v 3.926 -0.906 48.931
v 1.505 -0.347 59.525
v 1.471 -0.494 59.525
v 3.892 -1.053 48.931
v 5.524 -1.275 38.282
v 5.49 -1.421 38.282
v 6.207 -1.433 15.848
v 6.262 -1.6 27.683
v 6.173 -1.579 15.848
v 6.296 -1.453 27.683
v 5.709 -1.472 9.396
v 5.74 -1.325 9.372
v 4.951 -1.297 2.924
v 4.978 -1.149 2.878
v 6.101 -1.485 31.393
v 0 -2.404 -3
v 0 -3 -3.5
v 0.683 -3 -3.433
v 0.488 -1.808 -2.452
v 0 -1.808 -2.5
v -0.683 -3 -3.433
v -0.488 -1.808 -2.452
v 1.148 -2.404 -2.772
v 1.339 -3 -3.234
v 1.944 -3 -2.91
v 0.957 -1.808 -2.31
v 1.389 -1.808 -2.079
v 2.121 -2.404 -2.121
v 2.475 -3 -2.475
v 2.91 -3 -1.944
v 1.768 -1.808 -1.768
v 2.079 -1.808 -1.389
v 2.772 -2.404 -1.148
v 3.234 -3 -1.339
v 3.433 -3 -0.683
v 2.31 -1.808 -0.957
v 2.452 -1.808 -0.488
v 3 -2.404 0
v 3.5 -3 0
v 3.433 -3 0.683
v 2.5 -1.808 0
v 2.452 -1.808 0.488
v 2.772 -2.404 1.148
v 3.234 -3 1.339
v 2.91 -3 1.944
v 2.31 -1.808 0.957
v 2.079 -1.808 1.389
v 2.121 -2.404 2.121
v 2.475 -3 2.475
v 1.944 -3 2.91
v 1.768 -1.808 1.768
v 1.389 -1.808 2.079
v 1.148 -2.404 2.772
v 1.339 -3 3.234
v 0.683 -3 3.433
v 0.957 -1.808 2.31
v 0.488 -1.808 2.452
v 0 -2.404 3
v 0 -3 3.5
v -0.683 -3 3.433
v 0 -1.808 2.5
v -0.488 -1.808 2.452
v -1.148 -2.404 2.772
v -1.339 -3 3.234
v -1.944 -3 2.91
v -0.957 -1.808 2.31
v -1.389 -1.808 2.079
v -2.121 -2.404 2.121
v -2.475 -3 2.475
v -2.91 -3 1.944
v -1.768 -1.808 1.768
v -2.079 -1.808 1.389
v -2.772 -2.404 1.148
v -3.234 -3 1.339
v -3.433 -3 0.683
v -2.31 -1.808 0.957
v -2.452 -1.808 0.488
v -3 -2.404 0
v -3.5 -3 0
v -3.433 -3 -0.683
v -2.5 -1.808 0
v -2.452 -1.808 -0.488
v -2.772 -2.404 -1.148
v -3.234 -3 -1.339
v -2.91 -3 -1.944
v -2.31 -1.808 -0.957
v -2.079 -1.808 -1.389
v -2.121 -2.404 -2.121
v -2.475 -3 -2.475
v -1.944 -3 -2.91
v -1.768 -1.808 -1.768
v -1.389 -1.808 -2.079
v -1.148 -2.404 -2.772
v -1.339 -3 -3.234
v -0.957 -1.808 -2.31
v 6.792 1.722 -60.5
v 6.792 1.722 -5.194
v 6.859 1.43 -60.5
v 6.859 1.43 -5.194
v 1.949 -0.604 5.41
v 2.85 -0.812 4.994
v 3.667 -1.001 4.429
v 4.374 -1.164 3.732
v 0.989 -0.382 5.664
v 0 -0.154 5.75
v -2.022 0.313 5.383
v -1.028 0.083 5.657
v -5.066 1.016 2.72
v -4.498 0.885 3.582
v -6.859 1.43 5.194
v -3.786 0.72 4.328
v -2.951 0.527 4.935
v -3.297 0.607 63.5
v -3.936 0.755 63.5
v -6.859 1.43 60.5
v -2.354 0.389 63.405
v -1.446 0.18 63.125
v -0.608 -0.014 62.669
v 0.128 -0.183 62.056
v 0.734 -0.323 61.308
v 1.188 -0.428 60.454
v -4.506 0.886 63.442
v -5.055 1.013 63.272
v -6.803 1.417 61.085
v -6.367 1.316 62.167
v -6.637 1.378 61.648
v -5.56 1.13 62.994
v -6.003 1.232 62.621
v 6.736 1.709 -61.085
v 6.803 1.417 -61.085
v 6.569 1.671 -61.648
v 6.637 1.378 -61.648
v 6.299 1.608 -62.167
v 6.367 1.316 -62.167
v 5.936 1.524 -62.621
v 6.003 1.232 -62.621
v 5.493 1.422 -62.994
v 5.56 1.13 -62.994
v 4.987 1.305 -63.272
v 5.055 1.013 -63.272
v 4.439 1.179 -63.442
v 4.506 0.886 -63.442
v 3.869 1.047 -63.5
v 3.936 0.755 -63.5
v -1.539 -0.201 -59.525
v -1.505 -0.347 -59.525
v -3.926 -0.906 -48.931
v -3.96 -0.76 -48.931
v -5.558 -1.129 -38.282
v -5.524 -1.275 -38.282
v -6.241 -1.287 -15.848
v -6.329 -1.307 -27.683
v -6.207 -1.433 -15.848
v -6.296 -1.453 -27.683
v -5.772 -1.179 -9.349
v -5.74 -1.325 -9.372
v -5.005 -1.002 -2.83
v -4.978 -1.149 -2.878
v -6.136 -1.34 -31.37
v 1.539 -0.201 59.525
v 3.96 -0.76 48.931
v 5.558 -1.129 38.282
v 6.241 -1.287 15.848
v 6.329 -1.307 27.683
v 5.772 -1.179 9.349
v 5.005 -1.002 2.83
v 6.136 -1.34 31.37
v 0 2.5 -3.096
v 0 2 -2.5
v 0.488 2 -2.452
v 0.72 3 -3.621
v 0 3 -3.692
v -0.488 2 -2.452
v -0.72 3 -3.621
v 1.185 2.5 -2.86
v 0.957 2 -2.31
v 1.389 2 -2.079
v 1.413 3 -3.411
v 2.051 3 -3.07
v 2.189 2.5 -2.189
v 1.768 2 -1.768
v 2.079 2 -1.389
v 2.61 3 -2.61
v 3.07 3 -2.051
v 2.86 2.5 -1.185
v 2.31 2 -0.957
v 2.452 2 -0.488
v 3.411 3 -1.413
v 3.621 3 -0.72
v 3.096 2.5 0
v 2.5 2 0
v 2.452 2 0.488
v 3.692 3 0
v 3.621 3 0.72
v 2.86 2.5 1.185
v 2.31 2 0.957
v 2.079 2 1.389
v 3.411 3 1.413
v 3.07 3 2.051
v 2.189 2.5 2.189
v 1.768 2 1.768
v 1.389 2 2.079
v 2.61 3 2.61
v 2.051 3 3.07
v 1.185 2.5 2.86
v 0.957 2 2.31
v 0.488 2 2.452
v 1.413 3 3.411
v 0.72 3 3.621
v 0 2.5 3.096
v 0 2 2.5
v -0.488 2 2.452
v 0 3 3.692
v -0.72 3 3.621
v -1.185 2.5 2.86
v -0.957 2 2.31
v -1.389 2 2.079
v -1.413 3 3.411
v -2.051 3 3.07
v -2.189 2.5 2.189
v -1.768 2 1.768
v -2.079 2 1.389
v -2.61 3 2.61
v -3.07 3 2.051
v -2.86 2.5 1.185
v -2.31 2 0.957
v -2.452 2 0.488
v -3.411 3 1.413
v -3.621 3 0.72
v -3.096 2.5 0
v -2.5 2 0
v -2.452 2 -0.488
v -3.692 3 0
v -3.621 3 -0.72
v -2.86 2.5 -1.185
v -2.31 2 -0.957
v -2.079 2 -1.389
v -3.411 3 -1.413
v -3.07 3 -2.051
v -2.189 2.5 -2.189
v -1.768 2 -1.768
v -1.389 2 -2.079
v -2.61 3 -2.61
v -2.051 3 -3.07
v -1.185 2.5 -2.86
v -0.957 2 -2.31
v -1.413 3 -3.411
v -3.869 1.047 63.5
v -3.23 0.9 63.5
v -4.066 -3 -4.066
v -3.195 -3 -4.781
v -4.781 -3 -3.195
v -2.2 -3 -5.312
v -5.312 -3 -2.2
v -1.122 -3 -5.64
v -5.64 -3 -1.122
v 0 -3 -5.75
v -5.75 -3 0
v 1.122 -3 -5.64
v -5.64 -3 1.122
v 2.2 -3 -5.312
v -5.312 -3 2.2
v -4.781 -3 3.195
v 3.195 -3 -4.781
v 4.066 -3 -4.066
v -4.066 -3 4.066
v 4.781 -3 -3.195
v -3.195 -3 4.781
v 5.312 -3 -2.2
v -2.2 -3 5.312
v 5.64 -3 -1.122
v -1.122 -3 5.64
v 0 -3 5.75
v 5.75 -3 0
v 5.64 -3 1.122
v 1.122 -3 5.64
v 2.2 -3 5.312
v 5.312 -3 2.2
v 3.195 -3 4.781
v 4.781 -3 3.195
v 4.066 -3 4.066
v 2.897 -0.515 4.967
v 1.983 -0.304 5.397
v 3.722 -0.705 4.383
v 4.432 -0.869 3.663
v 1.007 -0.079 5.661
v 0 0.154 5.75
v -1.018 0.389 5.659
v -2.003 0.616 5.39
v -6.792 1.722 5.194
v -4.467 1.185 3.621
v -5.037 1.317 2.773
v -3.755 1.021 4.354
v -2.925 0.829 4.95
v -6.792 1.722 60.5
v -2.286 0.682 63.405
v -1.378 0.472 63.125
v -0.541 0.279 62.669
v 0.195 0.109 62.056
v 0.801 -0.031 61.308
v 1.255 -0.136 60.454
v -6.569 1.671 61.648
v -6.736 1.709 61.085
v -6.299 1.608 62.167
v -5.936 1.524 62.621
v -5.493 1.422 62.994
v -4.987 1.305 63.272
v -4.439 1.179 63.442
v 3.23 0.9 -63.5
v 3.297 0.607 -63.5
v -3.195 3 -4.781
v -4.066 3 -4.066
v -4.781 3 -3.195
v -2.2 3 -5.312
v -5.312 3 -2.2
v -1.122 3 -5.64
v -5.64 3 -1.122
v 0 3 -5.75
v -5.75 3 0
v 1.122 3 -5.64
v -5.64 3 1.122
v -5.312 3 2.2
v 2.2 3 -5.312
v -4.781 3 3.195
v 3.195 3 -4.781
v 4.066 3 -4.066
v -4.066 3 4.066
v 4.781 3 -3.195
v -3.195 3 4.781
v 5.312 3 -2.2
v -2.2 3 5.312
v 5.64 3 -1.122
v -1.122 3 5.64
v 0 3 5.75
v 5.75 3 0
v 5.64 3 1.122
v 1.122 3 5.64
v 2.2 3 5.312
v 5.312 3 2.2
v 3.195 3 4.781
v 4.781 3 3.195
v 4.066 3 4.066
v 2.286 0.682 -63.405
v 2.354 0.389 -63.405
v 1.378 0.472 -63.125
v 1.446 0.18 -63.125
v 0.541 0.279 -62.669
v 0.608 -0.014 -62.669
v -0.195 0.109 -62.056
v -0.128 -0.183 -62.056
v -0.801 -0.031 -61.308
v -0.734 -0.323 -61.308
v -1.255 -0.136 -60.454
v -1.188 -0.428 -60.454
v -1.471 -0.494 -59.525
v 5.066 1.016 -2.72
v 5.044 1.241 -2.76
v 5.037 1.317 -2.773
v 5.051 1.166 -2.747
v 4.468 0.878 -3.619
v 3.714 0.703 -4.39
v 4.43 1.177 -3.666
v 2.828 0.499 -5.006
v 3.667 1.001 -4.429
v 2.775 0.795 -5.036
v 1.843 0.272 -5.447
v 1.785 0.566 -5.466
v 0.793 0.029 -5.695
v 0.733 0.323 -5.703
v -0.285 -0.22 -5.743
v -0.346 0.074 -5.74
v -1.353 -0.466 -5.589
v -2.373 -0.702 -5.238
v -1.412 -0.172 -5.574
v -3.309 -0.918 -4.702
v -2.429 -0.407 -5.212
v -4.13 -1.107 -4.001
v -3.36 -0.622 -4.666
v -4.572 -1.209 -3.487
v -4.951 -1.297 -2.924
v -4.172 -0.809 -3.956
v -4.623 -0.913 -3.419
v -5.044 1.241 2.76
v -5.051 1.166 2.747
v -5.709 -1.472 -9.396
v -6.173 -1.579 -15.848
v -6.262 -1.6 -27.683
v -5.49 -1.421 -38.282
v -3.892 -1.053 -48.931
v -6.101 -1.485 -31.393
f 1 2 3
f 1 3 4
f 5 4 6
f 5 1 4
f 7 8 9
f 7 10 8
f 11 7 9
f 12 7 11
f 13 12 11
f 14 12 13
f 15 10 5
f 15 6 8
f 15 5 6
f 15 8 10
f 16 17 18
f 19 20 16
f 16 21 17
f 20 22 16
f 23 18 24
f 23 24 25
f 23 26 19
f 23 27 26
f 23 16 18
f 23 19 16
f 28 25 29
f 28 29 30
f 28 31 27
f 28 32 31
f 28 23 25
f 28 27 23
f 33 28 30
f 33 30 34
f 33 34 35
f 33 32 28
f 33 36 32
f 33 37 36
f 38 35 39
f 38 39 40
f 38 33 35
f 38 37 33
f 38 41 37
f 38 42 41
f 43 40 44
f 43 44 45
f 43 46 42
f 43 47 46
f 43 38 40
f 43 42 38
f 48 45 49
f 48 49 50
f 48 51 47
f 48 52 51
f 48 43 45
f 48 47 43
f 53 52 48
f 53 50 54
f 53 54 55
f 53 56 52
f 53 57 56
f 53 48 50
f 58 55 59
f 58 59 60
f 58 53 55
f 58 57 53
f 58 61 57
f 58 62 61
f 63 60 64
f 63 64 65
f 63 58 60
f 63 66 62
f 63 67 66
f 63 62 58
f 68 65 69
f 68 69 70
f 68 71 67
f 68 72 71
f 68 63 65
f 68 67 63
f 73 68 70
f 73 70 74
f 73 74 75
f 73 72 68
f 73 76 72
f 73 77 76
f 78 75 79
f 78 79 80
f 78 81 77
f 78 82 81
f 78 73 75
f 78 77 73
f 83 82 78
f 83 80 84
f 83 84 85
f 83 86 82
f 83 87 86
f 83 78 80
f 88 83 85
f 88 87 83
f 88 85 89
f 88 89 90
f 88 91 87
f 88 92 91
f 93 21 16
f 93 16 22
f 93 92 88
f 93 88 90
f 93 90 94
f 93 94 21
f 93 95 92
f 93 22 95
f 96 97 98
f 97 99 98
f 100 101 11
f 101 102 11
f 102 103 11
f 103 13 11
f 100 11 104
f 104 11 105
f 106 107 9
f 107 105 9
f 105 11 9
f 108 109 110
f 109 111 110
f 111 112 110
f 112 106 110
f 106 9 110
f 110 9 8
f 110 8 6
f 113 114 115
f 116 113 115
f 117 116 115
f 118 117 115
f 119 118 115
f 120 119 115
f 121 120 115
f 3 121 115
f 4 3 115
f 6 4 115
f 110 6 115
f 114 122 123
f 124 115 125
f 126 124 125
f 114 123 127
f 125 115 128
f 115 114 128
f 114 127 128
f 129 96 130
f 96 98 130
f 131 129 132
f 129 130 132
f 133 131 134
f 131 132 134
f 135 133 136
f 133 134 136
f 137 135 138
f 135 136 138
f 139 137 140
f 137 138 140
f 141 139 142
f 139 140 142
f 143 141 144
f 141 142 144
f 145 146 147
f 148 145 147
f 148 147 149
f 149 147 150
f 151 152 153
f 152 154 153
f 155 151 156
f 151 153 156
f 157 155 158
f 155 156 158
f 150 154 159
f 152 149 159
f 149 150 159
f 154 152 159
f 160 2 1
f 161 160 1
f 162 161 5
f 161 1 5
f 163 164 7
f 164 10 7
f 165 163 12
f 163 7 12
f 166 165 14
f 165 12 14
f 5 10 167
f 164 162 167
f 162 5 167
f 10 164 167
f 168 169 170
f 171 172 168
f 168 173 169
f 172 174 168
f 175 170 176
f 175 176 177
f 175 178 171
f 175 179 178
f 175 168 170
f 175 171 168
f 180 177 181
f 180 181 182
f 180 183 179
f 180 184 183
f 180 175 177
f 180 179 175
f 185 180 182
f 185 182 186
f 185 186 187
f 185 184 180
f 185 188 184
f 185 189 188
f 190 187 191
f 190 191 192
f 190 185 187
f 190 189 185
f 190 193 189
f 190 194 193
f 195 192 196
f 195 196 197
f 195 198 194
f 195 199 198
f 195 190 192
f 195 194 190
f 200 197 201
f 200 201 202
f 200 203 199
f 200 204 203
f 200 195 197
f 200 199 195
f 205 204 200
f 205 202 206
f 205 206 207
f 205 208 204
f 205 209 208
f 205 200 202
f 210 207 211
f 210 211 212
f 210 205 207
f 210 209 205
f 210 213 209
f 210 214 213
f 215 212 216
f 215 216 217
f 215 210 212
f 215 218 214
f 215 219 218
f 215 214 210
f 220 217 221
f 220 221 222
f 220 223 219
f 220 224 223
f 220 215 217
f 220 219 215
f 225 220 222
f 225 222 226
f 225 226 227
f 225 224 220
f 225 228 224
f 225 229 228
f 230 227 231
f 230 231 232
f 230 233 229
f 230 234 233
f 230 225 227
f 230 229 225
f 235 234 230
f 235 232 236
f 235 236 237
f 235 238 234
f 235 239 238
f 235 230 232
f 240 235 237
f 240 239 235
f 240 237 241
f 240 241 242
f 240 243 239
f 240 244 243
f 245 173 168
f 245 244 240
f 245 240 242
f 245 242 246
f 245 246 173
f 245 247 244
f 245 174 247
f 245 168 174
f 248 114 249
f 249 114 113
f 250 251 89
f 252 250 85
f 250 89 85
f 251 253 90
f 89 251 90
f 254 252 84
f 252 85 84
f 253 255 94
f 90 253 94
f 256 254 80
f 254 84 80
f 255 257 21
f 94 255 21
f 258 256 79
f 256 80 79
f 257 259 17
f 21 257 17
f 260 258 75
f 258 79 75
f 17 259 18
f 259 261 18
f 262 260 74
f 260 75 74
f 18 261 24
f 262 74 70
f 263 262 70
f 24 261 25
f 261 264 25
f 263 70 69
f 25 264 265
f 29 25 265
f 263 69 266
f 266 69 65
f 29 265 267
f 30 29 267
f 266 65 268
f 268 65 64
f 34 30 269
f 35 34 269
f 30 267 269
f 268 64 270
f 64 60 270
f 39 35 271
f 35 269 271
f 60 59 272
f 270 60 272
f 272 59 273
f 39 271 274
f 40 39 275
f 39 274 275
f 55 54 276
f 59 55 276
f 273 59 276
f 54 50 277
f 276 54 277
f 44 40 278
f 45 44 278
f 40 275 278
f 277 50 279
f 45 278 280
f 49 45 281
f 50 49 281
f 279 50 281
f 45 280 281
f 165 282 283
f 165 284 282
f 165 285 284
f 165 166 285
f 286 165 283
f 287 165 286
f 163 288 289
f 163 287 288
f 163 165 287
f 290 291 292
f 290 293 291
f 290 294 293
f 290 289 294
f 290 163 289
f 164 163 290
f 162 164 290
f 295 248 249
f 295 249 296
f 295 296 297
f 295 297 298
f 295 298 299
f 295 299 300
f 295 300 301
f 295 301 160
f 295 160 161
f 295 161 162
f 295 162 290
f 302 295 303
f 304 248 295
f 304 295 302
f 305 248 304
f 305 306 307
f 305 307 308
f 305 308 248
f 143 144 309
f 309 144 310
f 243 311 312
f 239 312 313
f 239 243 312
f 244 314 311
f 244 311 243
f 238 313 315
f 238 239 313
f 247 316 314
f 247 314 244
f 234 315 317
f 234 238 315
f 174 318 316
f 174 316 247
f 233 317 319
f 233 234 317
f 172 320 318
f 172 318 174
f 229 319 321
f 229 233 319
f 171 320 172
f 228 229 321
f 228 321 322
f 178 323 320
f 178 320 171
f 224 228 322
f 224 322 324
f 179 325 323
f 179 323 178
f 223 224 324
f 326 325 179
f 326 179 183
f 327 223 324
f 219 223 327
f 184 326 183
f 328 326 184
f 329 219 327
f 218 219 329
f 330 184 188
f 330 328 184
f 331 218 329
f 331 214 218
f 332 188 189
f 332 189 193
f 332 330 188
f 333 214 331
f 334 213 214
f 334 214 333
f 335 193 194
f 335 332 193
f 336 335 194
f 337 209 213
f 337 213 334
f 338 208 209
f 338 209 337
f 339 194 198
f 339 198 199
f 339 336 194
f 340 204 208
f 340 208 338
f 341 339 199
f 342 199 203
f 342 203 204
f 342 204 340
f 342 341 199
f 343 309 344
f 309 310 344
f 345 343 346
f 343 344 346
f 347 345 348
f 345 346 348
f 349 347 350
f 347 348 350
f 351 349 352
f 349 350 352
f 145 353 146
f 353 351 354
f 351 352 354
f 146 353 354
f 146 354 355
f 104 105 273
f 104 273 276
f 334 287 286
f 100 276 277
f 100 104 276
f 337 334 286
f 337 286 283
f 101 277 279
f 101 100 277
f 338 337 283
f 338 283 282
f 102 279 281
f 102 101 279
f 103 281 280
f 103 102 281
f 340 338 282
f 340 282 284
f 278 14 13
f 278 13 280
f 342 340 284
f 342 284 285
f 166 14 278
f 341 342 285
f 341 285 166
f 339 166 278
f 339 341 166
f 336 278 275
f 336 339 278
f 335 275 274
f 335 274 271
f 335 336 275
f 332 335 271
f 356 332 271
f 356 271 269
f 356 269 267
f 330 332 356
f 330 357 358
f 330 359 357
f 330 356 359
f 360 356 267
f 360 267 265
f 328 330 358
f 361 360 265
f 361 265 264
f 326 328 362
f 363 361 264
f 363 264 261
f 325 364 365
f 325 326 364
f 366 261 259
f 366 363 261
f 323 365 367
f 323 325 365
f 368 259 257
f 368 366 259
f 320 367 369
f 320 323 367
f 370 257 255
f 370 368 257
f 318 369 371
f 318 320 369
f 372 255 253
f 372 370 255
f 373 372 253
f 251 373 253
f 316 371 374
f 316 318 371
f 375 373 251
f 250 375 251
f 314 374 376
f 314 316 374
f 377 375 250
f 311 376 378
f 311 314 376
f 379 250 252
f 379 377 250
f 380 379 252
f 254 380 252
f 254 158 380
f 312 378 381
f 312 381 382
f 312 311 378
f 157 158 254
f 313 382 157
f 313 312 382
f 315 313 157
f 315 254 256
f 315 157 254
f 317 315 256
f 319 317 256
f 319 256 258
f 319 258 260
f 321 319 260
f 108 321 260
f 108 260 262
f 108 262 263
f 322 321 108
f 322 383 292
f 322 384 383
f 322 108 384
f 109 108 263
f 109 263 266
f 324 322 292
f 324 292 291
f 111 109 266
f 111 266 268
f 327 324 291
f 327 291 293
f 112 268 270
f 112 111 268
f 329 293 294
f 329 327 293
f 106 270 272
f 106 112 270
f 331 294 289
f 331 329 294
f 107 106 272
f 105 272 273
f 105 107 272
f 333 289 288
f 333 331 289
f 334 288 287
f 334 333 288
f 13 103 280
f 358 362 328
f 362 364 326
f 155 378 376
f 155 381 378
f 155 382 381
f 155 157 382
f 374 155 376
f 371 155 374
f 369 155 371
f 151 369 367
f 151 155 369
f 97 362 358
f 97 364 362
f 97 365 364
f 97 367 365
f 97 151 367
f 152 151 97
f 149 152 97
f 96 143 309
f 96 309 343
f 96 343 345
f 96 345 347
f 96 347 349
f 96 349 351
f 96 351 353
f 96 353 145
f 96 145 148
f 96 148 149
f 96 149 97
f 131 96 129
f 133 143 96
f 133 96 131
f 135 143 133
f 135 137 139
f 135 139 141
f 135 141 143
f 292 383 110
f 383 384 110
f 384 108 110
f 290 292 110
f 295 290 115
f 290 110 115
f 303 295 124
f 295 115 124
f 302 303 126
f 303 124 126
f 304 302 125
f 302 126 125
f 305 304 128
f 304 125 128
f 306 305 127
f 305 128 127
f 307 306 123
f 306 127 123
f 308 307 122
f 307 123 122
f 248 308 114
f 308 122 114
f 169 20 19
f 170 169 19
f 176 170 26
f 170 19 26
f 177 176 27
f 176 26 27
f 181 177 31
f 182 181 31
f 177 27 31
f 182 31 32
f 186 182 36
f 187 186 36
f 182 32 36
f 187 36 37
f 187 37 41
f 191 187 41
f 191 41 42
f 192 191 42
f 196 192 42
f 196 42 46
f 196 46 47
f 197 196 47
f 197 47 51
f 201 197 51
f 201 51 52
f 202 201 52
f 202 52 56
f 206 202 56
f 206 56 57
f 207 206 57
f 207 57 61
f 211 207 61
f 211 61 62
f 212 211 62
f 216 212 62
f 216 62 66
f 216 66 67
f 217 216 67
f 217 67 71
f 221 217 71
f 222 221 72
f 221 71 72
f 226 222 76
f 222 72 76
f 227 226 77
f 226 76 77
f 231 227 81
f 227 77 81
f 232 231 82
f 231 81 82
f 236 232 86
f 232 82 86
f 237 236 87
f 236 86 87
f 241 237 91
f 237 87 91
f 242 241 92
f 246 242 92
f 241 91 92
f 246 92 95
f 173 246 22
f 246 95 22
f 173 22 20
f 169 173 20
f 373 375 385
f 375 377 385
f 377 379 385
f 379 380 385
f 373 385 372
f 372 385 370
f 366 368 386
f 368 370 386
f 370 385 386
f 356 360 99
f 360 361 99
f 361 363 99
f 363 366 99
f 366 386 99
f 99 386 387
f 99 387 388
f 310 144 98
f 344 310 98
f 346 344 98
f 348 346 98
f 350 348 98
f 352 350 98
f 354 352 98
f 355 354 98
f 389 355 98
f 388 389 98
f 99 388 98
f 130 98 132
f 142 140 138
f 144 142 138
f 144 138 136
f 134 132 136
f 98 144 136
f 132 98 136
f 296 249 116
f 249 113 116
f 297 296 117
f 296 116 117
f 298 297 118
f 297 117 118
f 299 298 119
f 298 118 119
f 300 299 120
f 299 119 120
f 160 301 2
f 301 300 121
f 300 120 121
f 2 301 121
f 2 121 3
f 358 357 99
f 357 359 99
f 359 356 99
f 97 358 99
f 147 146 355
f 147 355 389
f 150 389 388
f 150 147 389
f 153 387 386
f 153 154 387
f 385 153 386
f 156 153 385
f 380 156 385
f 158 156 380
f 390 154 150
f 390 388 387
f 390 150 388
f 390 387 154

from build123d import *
from OCP.BRepFilletAPI import BRepFilletAPI_MakeChamfer

# Parameters (mm, degrees)
SKETCH1_R           = 5.75
BOSS_EXTRUDE1_DEPTH = 3
BOSS_EXTRUDE2_DEPTH = 0.15
CIRPATTERN1_COUNT   = 2
SKETCH4_R           = 2.5
CUT_EXTRUDE1_DEPTH  = 65.150588849
CHAMFER2_SIZE       = 1
CHAMFER2_SIZE2      = 1.191753593


with BuildPart() as part:
    # Sketch1 → Boss-Extrude1 (new, symmetric)
    with BuildSketch(Plane(origin=(0, 0, 0), x_dir=(1, 0, 0), z_dir=(0, 1, 0))):
        with Locations(Location((0, 0, 0), (0, 0, 270))):
            Circle(SKETCH1_R)
    extrude(amount=BOSS_EXTRUDE1_DEPTH, both=True)

    # Sketch3 → Boss-Extrude2 (add, symmetric)
    with BuildSketch(Plane(origin=(0, 0, 0), x_dir=(0.9743700647852351, -0.2249510543438655, 0), z_dir=(-0.2249510543438655, -0.9743700647852351, 0))):
        with BuildLine():
            Line((-4.594330289, 1.95406384), (-7.004950747, 5.194012526))
            Line((-7.004950747, 5.194012526), (-7.004950747, 60.5))
            ThreePointArc((-7.004950747, 60.5), (-6.12627109, 62.621320344), (-4.004950747, 63.5))
            Line((-4.004950747, 63.5), (-3.349097477, 63.5))
            ThreePointArc((-3.349097477, 63.5), (-0.196862037, 62.381161132), (1.54463599, 59.525364693))
            add(Edge.make_bspline(
                [(1.54463599, 59.525364693), (9.475219296, 30.694015203), (4.834288523, 1.046023407)],
                knots=[0, 0, 0, 1, 1, 1], degree=2))
            add(Edge.make_bspline(
                [(-4.594330289, 1.95406384), (0.469577579, 8.859977358), (4.834288523, 1.046023407)],
                knots=[0, 0, 0, 1, 1, 1], degree=2))
        make_face()
    boss_extrude2 = extrude(amount=BOSS_EXTRUDE2_DEPTH, both=True)

    # CirPattern1: Boss-Extrude2 ×2 about axis
    cirpattern1_axis = Axis((0, 3, 0), (0, -1, 0))
    for i in range(1, CIRPATTERN1_COUNT):
        add(boss_extrude2.rotate(cirpattern1_axis, i * 360 / CIRPATTERN1_COUNT))

    # Sketch4 → Cut-Extrude1 (cut, through all)
    with BuildSketch(Plane.XZ.offset(3)):
        with Locations(Location((0, 0, 0), (0, 0, 270))):
            Circle(SKETCH4_R)
    extrude(amount=-CUT_EXTRUDE1_DEPTH, mode=Mode.SUBTRACT)

    # Chamfer2: one chamfer whose edges measure the first distance from different faces: ONE call of the kernel's chamfer builder (chamfer() names one face for all edges)
    chamfer2_edges_1 = [part.edges().sort_by_distance(p)[0] for p in [
        (0, 3, 2.5),
    ]]
    chamfer2_side_1 = [part.faces().sort_by_distance(p)[0] for p in [
        (0, 0, 2.5),
    ]]
    chamfer2_edges_2 = [part.edges().sort_by_distance(p)[0] for p in [
        (0, -3, 2.5),
    ]]
    chamfer2_side_2 = [part.faces().sort_by_distance(p)[0] for p in [
        (0, -3, -5.58736544),
    ]]
    chamfer2 = BRepFilletAPI_MakeChamfer(part.part.solid().wrapped)
    for e in chamfer2_edges_1:
        chamfer2.Add(CHAMFER2_SIZE, CHAMFER2_SIZE2, e.wrapped, chamfer2_side_1[0].wrapped)  # the first distance lies on this face
    for e in chamfer2_edges_2:
        chamfer2.Add(CHAMFER2_SIZE, CHAMFER2_SIZE2, e.wrapped, chamfer2_side_2[0].wrapped)  # the first distance lies on this face
    add(Compound.cast(chamfer2.Shape()), mode=Mode.REPLACE)


solid = part.part
